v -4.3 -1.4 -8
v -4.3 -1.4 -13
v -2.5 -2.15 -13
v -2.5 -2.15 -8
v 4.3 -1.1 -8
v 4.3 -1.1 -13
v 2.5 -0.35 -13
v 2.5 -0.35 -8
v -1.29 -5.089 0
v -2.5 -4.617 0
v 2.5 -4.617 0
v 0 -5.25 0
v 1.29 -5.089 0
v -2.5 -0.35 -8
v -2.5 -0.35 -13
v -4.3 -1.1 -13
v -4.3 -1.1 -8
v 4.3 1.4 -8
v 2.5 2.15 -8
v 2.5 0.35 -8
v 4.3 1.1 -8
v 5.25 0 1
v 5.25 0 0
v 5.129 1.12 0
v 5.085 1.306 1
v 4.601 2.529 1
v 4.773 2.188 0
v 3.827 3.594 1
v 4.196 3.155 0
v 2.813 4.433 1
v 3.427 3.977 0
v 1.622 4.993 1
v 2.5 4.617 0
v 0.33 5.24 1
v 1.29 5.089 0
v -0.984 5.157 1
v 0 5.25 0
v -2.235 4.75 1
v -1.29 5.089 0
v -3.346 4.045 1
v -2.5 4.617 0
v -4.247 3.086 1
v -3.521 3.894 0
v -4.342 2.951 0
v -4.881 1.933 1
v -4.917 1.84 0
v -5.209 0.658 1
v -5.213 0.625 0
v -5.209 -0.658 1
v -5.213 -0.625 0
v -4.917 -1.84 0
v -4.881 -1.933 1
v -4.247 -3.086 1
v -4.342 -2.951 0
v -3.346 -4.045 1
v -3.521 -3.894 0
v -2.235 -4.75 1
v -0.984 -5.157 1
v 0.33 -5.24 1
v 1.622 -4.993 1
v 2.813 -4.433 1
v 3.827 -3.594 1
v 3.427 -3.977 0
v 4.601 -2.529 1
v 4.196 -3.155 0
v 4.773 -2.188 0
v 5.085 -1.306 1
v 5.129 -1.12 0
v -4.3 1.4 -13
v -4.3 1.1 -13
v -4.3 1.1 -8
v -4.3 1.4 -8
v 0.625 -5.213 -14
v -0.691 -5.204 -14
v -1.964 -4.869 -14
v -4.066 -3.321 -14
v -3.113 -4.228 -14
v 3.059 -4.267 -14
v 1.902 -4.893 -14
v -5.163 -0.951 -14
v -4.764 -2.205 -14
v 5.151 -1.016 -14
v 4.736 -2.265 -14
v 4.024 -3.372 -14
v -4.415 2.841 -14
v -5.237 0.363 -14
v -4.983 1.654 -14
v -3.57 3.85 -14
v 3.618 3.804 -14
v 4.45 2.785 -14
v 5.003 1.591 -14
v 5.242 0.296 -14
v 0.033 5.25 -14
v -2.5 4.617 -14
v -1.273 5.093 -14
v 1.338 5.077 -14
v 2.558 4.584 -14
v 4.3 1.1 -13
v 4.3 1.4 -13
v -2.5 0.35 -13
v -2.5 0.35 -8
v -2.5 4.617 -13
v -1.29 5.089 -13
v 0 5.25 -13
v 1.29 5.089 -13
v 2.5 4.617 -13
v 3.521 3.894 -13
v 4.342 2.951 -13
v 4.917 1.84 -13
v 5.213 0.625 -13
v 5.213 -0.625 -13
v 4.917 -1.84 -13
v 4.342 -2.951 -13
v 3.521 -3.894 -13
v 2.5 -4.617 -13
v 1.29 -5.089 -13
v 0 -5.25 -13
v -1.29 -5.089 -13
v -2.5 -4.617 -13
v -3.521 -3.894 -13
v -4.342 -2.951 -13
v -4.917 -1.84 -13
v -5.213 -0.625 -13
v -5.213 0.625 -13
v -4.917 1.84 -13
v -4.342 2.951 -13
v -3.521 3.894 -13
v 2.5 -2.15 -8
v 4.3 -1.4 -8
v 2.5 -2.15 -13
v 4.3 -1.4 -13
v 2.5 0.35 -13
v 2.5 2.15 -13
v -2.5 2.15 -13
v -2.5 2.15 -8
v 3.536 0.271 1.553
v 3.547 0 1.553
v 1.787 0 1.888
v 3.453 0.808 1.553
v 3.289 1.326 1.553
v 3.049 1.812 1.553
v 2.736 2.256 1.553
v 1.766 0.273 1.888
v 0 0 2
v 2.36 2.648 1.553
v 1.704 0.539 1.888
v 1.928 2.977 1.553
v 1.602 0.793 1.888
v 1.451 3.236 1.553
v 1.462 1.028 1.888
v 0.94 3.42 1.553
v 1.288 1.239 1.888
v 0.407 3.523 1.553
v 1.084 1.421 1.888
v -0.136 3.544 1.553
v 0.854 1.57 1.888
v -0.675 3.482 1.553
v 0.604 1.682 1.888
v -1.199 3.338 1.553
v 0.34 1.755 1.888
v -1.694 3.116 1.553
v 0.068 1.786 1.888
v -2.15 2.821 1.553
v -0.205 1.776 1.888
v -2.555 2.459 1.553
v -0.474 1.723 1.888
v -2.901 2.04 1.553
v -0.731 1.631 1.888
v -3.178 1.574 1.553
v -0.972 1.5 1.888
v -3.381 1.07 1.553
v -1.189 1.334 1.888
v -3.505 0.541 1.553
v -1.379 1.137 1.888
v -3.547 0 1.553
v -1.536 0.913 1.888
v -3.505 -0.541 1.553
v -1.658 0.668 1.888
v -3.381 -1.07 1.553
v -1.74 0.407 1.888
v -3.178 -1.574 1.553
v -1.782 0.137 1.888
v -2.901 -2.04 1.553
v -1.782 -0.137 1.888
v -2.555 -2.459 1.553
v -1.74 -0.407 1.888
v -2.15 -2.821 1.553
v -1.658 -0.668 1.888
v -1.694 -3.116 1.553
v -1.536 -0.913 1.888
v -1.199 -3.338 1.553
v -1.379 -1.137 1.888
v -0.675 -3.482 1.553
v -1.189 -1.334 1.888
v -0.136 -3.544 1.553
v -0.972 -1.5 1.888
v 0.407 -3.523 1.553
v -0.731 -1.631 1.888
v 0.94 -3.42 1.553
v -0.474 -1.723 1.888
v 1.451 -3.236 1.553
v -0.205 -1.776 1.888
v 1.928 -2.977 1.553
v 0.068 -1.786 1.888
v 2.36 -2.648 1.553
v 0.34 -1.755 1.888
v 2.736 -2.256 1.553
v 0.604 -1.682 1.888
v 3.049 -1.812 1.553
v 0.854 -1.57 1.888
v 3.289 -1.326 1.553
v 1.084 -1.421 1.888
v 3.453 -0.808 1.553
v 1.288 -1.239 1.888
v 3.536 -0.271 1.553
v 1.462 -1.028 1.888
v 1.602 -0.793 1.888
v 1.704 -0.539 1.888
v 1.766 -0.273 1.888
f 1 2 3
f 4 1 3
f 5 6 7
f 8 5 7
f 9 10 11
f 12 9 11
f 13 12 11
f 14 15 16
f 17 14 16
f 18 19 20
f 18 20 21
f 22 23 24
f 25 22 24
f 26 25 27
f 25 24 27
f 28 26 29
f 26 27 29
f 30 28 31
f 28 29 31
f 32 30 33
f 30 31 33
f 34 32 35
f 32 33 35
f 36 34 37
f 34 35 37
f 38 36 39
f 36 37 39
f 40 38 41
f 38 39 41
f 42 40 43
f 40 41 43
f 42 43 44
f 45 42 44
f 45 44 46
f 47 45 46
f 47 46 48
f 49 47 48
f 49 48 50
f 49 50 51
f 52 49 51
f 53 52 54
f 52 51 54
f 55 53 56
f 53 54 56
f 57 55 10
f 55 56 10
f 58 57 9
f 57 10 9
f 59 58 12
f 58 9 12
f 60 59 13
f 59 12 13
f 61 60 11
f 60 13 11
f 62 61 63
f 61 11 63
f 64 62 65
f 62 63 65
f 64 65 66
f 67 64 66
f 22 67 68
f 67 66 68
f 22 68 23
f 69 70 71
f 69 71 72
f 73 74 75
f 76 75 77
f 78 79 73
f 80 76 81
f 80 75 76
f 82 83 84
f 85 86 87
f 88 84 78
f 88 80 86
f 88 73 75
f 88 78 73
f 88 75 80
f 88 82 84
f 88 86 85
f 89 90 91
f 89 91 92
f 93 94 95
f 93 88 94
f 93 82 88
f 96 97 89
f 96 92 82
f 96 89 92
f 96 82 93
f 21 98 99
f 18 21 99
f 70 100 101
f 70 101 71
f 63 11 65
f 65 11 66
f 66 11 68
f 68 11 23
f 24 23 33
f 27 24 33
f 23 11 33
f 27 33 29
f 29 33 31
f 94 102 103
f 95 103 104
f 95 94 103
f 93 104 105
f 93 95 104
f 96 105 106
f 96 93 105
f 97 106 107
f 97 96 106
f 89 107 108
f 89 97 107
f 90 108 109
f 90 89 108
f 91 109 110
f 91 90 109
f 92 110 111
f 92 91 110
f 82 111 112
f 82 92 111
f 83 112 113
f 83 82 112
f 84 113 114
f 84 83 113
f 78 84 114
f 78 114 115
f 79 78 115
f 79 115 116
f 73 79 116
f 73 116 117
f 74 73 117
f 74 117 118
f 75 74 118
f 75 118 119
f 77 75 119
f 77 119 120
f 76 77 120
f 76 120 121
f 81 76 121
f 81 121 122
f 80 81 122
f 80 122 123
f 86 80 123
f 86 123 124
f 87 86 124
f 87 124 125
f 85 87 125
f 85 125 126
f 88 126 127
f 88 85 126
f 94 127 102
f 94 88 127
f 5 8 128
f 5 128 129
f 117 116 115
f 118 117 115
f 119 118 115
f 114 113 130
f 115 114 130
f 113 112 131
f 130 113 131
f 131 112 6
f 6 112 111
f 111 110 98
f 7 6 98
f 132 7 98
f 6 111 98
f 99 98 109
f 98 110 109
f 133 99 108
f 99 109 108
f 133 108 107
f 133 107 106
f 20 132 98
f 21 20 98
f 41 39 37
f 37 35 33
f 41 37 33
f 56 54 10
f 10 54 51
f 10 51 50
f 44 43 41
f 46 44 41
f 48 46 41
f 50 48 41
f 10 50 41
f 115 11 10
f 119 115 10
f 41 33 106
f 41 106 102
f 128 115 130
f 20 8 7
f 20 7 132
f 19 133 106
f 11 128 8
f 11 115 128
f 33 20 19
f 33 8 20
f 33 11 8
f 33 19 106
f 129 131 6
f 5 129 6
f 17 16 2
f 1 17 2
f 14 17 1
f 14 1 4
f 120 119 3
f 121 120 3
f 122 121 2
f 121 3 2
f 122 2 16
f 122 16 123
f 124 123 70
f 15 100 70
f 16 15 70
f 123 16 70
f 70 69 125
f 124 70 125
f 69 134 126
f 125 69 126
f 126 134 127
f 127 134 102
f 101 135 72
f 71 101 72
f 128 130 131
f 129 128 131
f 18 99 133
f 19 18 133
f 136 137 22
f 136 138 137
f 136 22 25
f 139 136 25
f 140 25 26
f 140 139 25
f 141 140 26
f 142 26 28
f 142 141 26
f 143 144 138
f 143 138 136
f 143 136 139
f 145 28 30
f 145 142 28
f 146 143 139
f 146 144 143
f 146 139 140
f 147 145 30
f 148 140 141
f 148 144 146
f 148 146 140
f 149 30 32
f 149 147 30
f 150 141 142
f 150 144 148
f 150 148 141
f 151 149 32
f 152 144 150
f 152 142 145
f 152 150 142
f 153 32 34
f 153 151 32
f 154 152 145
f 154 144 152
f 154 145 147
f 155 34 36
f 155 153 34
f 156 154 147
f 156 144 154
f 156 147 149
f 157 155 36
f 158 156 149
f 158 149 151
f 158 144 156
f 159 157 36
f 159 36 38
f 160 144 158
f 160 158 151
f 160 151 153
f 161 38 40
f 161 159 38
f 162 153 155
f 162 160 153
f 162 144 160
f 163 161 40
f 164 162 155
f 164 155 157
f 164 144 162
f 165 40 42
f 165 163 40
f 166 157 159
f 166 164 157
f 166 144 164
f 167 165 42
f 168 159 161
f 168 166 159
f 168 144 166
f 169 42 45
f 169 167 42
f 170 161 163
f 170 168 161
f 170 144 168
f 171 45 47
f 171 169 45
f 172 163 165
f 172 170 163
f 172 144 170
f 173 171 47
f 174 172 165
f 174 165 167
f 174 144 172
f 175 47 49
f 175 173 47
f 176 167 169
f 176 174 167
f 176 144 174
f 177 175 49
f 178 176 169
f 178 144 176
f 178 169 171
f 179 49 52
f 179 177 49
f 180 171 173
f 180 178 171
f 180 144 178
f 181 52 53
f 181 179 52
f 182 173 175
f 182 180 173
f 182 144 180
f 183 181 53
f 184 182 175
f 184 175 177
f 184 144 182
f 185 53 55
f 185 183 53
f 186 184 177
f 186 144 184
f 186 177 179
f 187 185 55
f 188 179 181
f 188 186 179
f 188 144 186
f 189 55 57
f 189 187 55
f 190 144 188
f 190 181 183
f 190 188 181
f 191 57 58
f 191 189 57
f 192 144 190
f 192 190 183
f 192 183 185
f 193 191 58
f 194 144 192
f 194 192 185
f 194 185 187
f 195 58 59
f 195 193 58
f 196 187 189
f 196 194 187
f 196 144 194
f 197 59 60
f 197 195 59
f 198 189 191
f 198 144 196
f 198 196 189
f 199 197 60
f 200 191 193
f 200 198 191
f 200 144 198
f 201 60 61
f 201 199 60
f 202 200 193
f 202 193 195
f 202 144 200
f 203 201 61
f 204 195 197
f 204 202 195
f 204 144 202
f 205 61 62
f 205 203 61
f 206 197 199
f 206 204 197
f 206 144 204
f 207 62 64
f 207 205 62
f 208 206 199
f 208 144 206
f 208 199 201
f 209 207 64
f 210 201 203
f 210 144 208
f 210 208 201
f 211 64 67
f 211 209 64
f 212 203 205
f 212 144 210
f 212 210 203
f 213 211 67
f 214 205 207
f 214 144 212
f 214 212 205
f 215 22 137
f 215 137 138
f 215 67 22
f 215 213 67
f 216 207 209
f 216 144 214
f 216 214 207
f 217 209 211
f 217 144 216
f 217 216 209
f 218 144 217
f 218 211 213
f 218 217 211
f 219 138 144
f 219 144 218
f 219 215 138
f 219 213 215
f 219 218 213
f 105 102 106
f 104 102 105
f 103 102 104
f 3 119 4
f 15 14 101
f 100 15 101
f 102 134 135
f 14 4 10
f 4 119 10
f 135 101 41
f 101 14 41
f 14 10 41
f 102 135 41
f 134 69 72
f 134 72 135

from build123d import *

# Parameters (mm, degrees)
SKETCH1_R           = 5.25
BOSS_EXTRUDE1_DEPTH = 1
DOME1_FACE_RADIUS   = 5.25
DOME1_HEIGHT        = 1
SKETCH2_W           = 5
SKETCH2_H           = 9.233092656
BOSS_EXTRUDE2_DEPTH = 13
BOSS_EXTRUDE3_START = 1
SKETCH3_R           = 5.25
BOSS_EXTRUDE3_DEPTH = 1
BOSS_EXTRUDE4_DEPTH = 5


with BuildPart() as part:
    # Sketch1 → Boss-Extrude1 (new body)
    with BuildSketch(Plane.XY):
        Circle(SKETCH1_R)
    extrude(amount=BOSS_EXTRUDE1_DEPTH)

    # Dome1: a dome of height H over a round flat face of radius A is a cap of a sphere of radius (A * A + H * H) / (2 * H)
    dome1_r = (DOME1_FACE_RADIUS * DOME1_FACE_RADIUS + DOME1_HEIGHT * DOME1_HEIGHT) / (2 * DOME1_HEIGHT)
    dome1_base = Plane((0, 0, 1), z_dir=(0, 0, 1))
    with Locations(dome1_base.offset(DOME1_HEIGHT - dome1_r)):
        dome1_ball = Sphere(dome1_r, mode=Mode.PRIVATE)
    add(split(dome1_ball, bisect_by=dome1_base, keep=Keep.TOP, mode=Mode.PRIVATE))

    # Sketch2 → Boss-Extrude2 (add)
    with BuildSketch(Plane(origin=(0, 0, 0), x_dir=(-1, 0, 0), z_dir=(0, 0, -1))):
        Rectangle(SKETCH2_W, SKETCH2_H)
    extrude(amount=BOSS_EXTRUDE2_DEPTH)

    # Sketch3 → Boss-Extrude3 (add)
    with BuildSketch(Plane(origin=(0, 0, -13), x_dir=(-1, 0, 0), z_dir=(0, 0, -1)).offset(BOSS_EXTRUDE3_START)):
        with Locations(Location((0, 0, 0), (0, 0, 61.563109851))):
            Circle(SKETCH3_R)
    extrude(amount=-BOSS_EXTRUDE3_DEPTH)

    # Sketch4 → Boss-Extrude4 (add)
    with BuildSketch(Plane.XY.offset(-13)):
        Polygon((-4.3, 1.4), (-2.5, 2.15), (-2.5, 0.35), (-4.3, 1.1), align=None)
        Polygon((-4.3, -1.1), (-4.3, -1.4), (-2.5, -2.15), (-2.5, -0.35), align=None)
        Polygon((4.3, 1.4), (2.5, 2.15), (2.5, 0.35), (4.3, 1.1), align=None)
        Polygon((4.3, -1.1), (2.5, -0.35), (2.5, -2.15), (4.3, -1.4), align=None)
    extrude(amount=BOSS_EXTRUDE4_DEPTH)


solid = part.part
